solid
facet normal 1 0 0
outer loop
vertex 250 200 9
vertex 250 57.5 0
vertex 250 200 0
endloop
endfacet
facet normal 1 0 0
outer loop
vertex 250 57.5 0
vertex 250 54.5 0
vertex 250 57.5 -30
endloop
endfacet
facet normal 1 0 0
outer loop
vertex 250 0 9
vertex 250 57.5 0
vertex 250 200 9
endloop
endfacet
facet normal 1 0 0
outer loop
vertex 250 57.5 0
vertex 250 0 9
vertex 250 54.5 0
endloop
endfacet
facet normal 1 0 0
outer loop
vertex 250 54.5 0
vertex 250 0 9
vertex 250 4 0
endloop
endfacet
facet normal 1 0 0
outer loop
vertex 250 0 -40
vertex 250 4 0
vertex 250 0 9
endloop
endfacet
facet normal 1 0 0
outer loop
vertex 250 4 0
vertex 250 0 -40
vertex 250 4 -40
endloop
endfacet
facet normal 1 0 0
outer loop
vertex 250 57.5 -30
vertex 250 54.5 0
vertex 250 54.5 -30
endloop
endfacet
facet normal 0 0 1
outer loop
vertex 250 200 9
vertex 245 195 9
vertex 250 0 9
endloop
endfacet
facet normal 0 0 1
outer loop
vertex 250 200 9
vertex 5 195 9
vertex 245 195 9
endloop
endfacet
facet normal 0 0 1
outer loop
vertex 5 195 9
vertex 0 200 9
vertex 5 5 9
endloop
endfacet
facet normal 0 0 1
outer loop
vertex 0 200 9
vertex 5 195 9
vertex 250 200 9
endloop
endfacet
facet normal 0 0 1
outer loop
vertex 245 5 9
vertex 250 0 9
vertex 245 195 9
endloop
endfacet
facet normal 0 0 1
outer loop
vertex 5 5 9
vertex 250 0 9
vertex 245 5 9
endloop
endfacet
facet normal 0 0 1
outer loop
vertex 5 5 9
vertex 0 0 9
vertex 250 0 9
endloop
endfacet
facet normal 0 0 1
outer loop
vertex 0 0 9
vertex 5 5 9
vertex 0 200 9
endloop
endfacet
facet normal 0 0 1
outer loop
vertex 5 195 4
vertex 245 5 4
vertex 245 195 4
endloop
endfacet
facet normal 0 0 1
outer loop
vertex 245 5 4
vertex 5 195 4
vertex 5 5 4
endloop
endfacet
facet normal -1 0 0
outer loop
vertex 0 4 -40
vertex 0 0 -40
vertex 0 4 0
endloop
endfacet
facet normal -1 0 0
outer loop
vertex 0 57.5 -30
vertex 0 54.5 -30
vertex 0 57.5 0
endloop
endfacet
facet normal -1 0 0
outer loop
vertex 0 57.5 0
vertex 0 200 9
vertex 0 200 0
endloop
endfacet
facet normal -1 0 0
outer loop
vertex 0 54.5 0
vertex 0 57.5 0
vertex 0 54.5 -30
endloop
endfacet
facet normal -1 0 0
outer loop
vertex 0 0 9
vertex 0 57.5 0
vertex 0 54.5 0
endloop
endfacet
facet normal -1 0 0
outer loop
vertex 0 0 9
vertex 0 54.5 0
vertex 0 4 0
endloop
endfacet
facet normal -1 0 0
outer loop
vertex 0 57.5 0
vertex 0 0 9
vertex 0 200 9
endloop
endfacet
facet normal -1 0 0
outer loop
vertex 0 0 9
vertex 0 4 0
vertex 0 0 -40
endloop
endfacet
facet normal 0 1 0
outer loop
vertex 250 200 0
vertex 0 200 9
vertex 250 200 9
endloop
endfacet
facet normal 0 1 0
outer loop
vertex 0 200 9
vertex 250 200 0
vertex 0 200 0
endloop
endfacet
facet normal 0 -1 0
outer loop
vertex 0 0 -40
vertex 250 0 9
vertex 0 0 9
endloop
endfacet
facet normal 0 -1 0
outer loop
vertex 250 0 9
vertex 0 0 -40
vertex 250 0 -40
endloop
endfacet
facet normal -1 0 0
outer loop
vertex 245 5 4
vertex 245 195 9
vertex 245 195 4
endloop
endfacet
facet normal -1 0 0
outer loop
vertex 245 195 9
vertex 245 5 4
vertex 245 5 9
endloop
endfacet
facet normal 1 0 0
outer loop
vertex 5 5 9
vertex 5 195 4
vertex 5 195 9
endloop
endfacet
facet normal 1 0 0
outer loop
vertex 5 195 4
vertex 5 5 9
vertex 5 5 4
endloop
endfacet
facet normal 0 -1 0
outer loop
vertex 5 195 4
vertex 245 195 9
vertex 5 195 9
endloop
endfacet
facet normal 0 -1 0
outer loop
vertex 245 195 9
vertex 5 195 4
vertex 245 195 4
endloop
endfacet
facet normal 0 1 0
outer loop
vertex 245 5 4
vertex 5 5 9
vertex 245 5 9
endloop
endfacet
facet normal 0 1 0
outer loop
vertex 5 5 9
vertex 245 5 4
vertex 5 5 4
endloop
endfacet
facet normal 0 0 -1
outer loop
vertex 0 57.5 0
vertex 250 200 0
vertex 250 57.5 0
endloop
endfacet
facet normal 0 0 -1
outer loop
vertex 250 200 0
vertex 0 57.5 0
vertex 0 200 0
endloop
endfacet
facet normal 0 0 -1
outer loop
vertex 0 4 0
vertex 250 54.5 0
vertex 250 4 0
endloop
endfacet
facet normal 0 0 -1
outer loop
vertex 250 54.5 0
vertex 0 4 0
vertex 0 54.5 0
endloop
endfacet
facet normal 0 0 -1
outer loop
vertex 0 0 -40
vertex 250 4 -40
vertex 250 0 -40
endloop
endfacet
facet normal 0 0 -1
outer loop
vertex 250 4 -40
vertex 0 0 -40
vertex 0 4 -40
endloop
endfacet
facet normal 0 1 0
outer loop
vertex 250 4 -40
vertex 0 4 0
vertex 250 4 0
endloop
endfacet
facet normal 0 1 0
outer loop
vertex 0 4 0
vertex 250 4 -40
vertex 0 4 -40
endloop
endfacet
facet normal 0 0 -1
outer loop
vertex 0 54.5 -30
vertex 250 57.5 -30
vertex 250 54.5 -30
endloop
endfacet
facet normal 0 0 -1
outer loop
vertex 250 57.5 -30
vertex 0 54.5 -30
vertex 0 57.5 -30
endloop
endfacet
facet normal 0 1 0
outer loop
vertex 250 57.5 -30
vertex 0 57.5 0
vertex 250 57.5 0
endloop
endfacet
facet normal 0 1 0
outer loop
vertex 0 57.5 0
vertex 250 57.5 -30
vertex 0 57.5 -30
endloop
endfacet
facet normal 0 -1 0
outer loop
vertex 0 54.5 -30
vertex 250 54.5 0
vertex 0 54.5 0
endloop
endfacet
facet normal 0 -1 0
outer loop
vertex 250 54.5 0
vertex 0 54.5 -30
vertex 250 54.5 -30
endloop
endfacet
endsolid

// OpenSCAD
//
// Wohnmobil-Fensterbank
// - Oben: Platte + optional umlaufender Rand
// - Unten: zwei Halterungen zum Aufstecken
// Alle Maße in mm
//

// Unterplatte
shelf_width        = 250;   // Breite (X)
shelf_depth        = 200;   // Tiefe (Y)
shelf_thickness    = 4;     // Dicke der Platte

// Umlaufender Rand auf der OBERSEITE
rim_enabled        = true;  // <<== Rand an/aus
rim_height         = 5;     // Höhe des Randes über der Platte
rim_width          = 5;     // Breite des Randes nach innen

// Fensterbank, auf die aufgeklipst wird
board_thickness    = 50;    // Abstand zwischen den INNENflächen der beiden Halter
fit_clearance      = 0.5;   // Spiel für die Klemmung

// Äußerer Halter (fensterseitig, UNTEN)
outer_br_height    = 40;    // Höhe unter der Platte
outer_br_thickness = 4;     // Dicke in Y

// Innerer Halter (raumseitig, UNTEN)
inner_br_height    = 30;    // Höhe unter der Platte
inner_br_thickness = 3;     // Dicke in Y


// ---------- Module ----------

// Grundplatte + optionaler Rand oben
module base_plate_with_rim() {

    // Platte: z = 0 .. shelf_thickness  (OBERSEITE = z = shelf_thickness)
    cube([shelf_width, shelf_depth, shelf_thickness], center = false);

    // Rand auf der Oberseite (nur wenn aktiviert)
    if (rim_enabled && rim_height > 0 && rim_width > 0) {
        difference() {
            // äußerer Block für den Rand
            translate([0, 0, shelf_thickness])
                cube([shelf_width, shelf_depth, rim_height], center = false);

            // Innenbereich ausschneiden, damit nur der Ring stehen bleibt
            translate([rim_width,
                       rim_width,
                       shelf_thickness - 0.1])   // leicht überlappend, kein Spalt
                cube([shelf_width - 2*rim_width,
                      shelf_depth - 2*rim_width,
                      rim_height + 0.2], center = false);
        }
    }
}

// Halterungen auf der UNTERSEITE
module brackets() {
    // y = 0: Rückkante der neuen Fensterbank

    // äußerer Halter (direkt an der Rückkante, nach UNTEN)
    translate([0, 0, -outer_br_height])
        cube([shelf_width, outer_br_thickness, outer_br_height], center = false);

    // innerer Halter
    translate([0,
               outer_br_thickness + board_thickness + fit_clearance,
               -inner_br_height])
        cube([shelf_width, inner_br_thickness, inner_br_height], center = false);
}

module fensterbank() {
    base_plate_with_rim();
    brackets();
}

// Aufruf
fensterbank();
